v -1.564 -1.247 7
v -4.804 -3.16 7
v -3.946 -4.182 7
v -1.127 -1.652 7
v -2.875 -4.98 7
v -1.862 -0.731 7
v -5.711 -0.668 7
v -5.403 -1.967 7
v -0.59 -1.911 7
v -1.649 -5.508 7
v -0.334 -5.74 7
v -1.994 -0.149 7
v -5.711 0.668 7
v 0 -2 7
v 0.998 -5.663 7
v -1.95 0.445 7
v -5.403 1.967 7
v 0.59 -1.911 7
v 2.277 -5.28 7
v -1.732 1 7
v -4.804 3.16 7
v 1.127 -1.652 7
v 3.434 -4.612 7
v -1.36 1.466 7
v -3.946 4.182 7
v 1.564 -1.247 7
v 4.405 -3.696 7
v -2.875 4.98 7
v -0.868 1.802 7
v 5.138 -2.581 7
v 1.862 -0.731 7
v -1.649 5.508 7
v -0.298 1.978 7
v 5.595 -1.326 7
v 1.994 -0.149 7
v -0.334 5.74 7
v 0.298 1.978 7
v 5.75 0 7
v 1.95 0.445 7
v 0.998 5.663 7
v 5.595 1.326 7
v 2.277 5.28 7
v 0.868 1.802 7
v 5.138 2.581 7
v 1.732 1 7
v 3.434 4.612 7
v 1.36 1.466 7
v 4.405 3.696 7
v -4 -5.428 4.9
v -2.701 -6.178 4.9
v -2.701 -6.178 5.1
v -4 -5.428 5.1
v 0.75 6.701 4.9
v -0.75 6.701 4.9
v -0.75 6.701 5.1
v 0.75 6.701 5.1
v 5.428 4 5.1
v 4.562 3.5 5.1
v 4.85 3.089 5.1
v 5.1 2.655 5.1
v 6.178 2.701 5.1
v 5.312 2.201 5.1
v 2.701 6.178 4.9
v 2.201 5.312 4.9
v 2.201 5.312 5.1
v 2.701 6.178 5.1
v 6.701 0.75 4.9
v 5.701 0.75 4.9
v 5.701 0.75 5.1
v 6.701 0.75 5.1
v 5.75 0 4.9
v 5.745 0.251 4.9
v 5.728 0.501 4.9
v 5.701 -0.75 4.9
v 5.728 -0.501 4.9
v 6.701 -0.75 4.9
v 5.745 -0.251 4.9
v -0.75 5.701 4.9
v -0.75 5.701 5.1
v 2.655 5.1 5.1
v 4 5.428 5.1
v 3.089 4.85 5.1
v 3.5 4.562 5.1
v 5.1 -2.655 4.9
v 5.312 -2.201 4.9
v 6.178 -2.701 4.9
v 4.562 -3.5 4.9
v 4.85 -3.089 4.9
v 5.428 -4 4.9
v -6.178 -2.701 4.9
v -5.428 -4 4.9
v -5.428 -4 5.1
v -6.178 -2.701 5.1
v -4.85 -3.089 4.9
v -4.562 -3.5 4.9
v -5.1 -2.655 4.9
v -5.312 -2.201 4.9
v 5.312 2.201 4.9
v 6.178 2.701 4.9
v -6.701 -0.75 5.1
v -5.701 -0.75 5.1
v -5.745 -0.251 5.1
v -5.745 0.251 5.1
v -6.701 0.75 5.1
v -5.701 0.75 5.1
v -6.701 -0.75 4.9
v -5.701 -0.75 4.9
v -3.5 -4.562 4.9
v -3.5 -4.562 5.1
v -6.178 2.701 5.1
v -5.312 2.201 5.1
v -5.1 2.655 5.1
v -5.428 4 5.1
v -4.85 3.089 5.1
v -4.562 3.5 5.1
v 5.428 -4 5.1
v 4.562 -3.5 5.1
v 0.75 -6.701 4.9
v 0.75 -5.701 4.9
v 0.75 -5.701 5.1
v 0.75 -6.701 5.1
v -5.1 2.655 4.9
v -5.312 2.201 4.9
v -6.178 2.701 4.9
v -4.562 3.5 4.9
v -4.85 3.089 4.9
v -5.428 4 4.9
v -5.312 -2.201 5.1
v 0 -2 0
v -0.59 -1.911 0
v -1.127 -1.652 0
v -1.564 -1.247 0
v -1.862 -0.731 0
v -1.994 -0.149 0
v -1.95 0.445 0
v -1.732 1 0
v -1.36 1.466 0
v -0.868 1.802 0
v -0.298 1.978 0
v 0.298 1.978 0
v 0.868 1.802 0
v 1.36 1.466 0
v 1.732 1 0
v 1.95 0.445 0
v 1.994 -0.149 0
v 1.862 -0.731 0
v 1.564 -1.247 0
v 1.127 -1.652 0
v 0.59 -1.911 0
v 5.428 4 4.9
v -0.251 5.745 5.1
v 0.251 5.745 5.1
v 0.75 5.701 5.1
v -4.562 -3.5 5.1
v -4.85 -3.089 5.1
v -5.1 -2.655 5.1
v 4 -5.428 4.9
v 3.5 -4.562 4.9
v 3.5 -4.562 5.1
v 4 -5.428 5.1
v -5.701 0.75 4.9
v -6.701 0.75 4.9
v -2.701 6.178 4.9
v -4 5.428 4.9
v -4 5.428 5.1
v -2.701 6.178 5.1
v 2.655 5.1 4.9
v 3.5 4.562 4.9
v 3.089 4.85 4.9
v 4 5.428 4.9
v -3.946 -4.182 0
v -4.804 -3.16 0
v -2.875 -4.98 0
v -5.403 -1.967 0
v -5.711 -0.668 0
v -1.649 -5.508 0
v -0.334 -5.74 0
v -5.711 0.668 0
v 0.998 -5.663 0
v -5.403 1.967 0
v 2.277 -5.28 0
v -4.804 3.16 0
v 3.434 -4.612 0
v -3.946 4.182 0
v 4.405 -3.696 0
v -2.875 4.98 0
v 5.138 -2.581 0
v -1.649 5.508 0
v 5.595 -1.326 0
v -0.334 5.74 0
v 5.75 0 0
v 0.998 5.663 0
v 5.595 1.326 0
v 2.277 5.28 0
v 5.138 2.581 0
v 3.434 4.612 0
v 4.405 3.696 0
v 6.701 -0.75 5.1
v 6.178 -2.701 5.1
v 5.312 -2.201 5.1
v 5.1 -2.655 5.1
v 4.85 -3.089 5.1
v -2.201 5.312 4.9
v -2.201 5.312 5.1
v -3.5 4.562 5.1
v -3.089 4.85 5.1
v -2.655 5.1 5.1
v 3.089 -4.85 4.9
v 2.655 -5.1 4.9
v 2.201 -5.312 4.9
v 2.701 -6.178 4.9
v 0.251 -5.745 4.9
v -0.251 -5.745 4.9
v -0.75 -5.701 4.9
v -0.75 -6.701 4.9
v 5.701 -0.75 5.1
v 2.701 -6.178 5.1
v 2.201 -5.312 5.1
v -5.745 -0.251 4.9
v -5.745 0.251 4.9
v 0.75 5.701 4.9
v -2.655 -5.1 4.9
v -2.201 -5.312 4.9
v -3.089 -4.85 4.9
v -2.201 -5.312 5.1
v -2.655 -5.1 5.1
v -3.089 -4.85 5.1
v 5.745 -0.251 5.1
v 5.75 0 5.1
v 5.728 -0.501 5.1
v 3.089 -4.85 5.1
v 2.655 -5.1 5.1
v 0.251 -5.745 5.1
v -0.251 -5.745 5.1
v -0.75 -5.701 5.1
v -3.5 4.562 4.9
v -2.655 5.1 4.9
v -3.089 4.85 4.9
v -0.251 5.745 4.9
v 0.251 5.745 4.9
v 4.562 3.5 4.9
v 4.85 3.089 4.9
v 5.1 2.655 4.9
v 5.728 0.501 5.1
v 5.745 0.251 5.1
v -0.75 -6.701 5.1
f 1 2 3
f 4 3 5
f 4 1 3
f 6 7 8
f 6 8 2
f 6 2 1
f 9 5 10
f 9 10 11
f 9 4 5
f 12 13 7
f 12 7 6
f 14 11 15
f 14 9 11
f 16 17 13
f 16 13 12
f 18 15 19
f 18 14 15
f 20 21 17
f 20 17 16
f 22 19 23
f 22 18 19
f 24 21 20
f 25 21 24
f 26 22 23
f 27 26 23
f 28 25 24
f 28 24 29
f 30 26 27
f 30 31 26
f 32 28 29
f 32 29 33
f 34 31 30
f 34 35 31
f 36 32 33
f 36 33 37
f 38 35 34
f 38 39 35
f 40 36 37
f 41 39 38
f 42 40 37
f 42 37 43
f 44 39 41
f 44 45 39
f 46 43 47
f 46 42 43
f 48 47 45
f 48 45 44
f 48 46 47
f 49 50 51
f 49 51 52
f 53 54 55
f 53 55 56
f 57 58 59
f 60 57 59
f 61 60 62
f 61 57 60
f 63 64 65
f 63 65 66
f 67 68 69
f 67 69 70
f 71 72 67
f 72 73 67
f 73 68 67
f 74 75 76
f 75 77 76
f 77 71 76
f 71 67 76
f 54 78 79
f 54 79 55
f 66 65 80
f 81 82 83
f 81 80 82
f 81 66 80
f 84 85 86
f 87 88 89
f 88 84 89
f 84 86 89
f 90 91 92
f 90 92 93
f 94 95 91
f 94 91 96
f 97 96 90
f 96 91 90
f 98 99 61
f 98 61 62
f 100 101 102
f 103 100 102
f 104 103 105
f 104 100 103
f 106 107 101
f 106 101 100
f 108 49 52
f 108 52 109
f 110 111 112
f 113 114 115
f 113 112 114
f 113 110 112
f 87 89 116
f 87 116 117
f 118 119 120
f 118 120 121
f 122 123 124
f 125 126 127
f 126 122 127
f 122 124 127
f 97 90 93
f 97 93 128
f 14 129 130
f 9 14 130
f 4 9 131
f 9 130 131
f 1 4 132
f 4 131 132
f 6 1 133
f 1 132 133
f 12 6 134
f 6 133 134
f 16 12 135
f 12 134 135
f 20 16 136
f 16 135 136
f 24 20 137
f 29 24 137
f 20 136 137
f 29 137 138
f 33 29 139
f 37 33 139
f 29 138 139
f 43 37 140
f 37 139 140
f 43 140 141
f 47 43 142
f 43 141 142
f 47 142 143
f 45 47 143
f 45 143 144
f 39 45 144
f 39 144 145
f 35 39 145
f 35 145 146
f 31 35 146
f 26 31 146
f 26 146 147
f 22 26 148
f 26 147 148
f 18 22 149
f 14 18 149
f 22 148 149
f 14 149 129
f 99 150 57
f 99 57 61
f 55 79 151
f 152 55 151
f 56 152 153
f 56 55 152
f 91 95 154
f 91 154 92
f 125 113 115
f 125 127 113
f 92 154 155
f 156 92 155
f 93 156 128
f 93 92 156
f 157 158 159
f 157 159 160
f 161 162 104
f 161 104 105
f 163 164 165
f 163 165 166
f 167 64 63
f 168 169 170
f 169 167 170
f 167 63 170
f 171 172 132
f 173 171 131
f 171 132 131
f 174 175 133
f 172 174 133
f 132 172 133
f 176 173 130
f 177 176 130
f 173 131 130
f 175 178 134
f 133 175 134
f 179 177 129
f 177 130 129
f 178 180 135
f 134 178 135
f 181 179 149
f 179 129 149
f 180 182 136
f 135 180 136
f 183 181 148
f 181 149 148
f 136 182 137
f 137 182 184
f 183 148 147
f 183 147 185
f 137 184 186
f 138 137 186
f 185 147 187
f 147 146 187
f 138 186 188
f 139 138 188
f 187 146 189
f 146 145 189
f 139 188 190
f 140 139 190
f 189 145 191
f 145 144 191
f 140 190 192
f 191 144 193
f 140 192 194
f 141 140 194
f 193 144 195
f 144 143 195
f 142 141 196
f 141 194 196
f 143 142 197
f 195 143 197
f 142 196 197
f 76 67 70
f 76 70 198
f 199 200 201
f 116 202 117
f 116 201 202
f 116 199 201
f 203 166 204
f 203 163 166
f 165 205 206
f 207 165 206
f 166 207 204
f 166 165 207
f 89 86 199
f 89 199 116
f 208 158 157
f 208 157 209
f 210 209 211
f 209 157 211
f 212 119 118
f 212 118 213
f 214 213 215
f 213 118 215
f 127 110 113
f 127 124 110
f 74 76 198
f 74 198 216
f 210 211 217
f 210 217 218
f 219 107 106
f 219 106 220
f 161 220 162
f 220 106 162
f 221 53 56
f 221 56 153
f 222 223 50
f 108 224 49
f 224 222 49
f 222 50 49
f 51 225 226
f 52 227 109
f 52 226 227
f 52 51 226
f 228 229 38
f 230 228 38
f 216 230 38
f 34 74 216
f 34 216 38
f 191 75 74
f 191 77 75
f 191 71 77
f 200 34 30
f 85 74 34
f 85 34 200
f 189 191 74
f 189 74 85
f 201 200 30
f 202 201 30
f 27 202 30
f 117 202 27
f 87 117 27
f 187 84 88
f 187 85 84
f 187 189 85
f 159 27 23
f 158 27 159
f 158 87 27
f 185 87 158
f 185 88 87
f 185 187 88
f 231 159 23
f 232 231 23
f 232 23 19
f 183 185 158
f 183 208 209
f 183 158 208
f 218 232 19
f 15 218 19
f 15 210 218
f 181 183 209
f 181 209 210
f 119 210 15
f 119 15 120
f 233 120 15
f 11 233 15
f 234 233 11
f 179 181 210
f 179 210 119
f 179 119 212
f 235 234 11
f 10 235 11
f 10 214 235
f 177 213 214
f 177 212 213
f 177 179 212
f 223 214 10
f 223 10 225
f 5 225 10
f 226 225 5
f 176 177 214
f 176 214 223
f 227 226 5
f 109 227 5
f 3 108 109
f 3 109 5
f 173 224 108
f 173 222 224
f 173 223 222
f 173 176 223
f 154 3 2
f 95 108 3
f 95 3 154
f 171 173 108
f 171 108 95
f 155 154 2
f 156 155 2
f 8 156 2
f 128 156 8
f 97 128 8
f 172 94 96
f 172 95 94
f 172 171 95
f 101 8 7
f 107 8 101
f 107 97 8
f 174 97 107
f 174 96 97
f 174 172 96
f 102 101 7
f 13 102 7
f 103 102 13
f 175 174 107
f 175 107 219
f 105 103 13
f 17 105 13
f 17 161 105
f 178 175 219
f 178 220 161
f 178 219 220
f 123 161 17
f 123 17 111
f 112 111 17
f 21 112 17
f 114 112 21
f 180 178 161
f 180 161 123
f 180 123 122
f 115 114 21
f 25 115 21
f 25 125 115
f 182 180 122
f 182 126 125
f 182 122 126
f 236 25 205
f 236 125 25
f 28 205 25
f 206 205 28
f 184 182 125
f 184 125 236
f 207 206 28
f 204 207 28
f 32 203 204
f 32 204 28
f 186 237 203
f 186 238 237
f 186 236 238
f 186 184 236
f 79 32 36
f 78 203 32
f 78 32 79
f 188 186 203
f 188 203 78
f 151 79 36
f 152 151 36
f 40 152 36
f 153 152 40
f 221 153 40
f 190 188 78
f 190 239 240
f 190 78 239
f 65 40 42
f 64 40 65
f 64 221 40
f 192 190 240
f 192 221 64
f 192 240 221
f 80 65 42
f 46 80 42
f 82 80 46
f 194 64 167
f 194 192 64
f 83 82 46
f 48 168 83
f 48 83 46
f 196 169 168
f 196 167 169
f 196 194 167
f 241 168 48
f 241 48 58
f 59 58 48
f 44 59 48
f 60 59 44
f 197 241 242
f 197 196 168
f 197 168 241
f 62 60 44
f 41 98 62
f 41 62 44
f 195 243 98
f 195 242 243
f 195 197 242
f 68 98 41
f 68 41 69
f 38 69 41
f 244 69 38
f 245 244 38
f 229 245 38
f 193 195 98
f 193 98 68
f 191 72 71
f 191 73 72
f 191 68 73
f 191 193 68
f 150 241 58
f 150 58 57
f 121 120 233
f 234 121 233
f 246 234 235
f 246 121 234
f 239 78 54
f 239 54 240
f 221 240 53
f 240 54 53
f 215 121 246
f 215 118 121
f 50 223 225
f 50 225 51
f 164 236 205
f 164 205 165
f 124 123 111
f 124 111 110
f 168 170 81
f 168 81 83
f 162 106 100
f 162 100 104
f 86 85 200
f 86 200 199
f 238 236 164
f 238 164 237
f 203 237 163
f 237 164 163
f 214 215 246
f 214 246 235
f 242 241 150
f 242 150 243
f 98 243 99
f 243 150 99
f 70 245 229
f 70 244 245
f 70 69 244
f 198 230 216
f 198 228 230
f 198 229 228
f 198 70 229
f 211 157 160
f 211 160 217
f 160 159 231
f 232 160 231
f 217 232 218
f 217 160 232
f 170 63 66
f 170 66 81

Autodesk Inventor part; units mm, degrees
ref_plane "YZ Plane" through (0, 0, 0) normal (1, 0, 0) x (0, 1, 0)
ref_plane "XZ Plane" through (0, 0, 0) normal (0, 1, 0) x (-1, 0, 0)
sketch "Sketch1" plane through (0, 0, 0) normal (0, 0, 1) x (1, 0, 0)
  circle A0 centre (0, 0) radius 5.75
  dimension "d0" = 11.5
extrude "Extrusion1" add sketch "Sketch1" along normal blind 7
ref_plane "Work Plane1" through (0, 0, 5) normal (0, 0, 1) x (1, 0, 0)
sketch "Sketch2" plane through (0, 0, 5) normal (0, 0, 1) x (1, 0, 0)
  circle A0 centre (0, 0) radius 5.75 projected
  circle A1 centre (0, 0) radius 5.75 projected
  line L0 (-0.75, 5.7009) -> (-0.75, 6.7009)
  line L1 (-0.75, 6.7009) -> (0.75, 6.7009)
  line L2 (0.75, 6.7009) -> (0.75, 5.7009)
  dimension "d4" = 1.5
  dimension "d5" = 1
extrude "Extrusion2" add sketch "Sketch2" along normal mid plane 0.2 contours A0 L0 L1 L2
pattern_circular "Circular Pattern1" count 12 over 360 about axis through (0, 0, 0) along (0, 0, 1) of "Extrusion2"
sketch "Sketch3" plane through (0, 0, 7) normal (0, 0, 1) x (1, 0, 0)
  circle A0 centre (0, 0) radius 5.75 projected
hole "Hole1" at (0, 0, 7) direction (0, 0, -1) diameter 4 end through all
properties part number "ExtruderCouplingBowden" material "ABS Plastic"
